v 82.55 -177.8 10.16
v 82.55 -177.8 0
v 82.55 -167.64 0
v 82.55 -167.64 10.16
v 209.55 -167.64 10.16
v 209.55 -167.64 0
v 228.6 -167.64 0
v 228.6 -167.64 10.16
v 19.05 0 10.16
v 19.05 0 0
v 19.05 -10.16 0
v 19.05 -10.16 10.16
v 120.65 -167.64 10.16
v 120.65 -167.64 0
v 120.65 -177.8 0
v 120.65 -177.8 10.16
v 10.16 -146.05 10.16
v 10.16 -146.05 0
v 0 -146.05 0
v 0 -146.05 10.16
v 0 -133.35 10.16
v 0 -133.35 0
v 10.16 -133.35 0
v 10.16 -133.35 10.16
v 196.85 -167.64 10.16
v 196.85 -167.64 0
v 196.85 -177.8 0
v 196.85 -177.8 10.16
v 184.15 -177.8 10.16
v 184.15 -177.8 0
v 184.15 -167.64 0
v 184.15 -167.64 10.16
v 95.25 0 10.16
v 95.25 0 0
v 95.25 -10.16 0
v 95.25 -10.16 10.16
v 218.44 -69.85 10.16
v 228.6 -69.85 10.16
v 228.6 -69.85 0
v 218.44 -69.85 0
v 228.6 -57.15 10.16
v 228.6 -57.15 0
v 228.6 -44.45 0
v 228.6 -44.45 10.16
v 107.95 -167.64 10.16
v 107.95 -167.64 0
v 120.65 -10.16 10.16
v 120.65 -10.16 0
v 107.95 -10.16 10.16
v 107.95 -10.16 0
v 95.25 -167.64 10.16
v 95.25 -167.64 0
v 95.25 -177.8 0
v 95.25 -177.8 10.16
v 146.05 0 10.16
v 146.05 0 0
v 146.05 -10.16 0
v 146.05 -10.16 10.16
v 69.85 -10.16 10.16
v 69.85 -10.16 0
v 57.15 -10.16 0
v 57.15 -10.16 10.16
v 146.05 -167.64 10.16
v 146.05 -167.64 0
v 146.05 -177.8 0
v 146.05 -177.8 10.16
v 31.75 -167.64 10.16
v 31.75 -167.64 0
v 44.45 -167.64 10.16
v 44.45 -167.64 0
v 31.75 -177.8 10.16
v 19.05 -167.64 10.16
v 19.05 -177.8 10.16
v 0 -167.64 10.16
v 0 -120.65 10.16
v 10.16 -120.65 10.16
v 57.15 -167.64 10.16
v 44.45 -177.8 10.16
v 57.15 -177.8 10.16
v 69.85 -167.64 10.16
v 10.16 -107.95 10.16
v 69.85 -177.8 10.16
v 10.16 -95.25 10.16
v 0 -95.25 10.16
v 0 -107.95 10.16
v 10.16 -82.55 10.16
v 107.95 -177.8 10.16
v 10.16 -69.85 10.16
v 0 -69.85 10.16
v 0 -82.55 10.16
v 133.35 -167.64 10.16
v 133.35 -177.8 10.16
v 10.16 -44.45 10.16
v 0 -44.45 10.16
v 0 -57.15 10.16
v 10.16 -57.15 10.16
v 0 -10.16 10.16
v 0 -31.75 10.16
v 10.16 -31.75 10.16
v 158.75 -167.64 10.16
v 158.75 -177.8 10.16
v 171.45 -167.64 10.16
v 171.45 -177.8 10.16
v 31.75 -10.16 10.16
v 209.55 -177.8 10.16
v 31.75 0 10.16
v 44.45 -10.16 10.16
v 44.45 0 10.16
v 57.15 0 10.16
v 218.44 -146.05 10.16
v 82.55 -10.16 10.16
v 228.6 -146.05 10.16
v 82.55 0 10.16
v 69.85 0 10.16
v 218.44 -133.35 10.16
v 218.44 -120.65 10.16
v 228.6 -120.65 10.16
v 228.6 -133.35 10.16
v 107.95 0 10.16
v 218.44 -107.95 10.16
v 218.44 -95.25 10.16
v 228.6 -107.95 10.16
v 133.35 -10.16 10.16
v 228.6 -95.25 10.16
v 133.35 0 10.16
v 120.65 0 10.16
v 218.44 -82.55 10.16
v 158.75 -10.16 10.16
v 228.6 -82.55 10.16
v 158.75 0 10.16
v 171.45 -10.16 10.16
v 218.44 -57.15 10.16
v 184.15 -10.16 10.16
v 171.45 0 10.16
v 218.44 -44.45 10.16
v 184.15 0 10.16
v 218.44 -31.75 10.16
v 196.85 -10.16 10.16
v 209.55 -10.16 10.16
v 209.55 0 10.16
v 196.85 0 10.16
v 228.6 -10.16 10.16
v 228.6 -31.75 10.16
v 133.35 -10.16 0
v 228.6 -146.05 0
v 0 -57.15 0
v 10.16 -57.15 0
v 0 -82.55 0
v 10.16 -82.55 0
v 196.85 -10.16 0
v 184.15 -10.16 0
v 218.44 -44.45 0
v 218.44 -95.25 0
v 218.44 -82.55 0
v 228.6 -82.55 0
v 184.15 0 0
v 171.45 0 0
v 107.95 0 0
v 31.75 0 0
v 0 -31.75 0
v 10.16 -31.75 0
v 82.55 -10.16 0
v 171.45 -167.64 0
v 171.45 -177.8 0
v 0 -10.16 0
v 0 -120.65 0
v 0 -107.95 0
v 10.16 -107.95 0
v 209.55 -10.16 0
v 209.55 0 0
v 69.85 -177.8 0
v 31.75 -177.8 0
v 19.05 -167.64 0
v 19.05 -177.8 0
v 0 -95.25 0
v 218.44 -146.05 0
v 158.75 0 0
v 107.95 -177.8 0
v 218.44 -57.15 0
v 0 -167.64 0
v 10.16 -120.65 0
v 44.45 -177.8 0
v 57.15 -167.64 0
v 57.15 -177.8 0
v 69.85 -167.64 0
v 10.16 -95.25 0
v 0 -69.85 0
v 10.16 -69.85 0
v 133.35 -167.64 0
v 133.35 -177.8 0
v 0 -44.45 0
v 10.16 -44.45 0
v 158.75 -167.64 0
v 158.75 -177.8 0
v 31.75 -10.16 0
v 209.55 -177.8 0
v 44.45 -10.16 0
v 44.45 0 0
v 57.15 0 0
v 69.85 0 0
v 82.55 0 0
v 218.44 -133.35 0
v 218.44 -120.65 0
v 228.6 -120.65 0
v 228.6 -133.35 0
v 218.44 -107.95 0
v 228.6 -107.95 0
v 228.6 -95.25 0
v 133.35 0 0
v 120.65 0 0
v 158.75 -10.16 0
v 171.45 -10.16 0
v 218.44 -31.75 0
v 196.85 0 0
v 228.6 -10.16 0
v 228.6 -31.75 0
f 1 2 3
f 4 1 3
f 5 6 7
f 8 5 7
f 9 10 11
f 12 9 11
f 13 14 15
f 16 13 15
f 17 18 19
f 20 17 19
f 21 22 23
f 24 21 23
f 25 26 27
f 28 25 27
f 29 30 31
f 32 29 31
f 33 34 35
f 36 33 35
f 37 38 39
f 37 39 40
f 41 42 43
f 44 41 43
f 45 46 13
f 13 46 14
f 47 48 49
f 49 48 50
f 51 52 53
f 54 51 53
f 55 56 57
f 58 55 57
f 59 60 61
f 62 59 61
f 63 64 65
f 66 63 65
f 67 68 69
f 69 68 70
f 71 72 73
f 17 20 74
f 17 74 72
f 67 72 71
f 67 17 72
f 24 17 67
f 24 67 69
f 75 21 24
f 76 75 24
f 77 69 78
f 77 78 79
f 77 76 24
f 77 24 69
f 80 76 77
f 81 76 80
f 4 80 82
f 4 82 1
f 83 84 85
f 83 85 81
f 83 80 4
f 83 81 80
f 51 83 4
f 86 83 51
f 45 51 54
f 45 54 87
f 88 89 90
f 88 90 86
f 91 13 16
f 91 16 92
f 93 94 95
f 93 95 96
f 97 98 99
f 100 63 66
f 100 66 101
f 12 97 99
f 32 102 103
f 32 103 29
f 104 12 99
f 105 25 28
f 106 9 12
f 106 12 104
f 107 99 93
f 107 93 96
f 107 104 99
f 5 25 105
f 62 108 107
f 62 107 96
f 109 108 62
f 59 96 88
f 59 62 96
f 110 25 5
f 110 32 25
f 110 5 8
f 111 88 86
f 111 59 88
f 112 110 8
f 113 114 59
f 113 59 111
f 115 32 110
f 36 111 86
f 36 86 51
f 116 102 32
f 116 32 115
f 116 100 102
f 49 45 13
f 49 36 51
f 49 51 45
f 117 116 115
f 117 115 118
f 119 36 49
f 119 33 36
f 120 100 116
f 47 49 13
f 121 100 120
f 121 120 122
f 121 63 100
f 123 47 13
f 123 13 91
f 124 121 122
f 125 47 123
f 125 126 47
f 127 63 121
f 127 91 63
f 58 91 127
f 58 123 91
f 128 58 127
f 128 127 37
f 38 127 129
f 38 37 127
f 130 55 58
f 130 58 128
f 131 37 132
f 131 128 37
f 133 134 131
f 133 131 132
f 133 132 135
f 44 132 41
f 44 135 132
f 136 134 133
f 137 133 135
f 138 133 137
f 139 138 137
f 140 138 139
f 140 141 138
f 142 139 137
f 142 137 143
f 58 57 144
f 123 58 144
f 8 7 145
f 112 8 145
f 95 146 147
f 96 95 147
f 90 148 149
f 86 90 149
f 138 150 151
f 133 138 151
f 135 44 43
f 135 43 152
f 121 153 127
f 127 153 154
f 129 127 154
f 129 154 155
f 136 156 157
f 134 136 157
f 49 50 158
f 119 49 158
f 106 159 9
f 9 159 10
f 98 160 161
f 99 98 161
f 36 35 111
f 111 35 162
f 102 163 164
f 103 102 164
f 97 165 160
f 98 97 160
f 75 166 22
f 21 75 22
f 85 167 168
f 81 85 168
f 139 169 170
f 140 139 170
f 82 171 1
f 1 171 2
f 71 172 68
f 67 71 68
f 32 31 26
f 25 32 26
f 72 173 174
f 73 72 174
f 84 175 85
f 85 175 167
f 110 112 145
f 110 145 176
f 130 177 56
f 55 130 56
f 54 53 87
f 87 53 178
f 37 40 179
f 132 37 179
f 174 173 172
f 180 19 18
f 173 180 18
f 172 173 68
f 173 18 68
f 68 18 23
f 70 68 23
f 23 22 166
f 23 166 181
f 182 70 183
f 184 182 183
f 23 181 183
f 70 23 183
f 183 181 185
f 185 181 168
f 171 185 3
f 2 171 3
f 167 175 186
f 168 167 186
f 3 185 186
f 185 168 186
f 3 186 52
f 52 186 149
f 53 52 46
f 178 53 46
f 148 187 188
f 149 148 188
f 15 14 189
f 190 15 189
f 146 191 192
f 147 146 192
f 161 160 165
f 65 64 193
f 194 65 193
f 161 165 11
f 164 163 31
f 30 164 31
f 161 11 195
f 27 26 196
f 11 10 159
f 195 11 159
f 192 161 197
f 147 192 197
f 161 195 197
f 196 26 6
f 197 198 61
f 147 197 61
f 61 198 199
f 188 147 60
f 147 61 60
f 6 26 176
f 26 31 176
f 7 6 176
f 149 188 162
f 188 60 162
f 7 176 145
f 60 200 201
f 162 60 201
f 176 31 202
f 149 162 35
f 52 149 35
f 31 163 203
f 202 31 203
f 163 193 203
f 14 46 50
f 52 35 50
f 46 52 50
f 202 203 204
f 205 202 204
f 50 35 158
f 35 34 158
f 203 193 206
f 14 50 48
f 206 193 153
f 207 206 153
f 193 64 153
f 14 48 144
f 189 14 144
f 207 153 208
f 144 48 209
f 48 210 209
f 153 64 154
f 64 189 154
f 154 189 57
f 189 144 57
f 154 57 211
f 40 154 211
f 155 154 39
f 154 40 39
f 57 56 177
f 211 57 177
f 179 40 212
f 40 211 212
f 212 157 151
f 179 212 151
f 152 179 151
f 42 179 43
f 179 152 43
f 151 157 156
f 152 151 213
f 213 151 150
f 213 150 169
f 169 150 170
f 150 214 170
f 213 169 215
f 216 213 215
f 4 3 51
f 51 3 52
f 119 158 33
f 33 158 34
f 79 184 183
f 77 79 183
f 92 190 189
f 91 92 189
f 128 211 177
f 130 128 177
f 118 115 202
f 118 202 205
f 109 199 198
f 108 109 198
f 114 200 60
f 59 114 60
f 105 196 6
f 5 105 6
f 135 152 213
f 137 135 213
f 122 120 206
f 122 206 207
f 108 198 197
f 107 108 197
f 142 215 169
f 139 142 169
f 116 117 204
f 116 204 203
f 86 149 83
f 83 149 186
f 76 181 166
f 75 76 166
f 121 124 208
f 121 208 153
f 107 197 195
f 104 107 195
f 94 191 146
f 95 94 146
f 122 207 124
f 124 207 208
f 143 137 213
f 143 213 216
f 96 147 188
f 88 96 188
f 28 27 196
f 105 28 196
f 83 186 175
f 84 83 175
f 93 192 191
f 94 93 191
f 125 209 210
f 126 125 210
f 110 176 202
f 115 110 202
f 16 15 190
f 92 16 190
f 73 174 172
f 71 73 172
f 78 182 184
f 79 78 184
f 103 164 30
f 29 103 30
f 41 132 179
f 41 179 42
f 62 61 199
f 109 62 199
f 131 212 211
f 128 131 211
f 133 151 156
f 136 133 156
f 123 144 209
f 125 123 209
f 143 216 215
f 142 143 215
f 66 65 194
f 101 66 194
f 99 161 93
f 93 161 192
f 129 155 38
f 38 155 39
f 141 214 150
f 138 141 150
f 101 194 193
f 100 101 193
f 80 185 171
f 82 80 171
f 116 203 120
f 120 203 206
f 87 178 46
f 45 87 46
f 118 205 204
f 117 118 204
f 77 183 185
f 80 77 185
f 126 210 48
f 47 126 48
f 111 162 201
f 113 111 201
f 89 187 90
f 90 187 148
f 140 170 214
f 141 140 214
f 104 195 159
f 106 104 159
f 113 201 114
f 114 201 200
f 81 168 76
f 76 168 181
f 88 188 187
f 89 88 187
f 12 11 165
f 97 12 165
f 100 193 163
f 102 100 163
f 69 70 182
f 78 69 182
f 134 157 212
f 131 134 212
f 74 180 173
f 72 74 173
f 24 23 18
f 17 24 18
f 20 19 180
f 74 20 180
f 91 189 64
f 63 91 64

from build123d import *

# Parameters (mm, degrees)
F1_DEPTH = 10.16


with BuildPart() as f1:
    # F0 (on Top) → F1 (new body)
    with BuildSketch(Plane.XY):
        Polygon((31.75, 0), (19.05, 0), (19.05, -10.16), (0, -10.16), (0, -31.75), (10.16, -31.75), (10.16, -44.45), (0, -44.45), (0, -57.15), (10.16, -57.15), (10.16, -69.85), (0, -69.85), (0, -82.55), (10.16, -82.55), (10.16, -95.25), (0, -95.25), (0, -107.95), (10.16, -107.95), (10.16, -120.65), (0, -120.65), (0, -133.35), (10.16, -133.35), (10.16, -146.05), (0, -146.05), (0, -167.64), (19.05, -167.64), (19.05, -177.8), (31.75, -177.8), (31.75, -167.64), (44.45, -167.64), (44.45, -177.8), (57.15, -177.8), (57.15, -167.64), (69.85, -167.64), (69.85, -177.8), (82.55, -177.8), (82.55, -167.64), (95.25, -167.64), (95.25, -177.8), (107.95, -177.8), (107.95, -167.64), (120.65, -167.64), (120.65, -177.8), (133.35, -177.8), (133.35, -167.64), (146.05, -167.64), (146.05, -177.8), (158.75, -177.8), (158.75, -167.64), (171.45, -167.64), (171.45, -177.8), (184.15, -177.8), (184.15, -167.64), (196.85, -167.64), (196.85, -177.8), (209.55, -177.8), (209.55, -167.64), (228.6, -167.64), (228.6, -146.05), (218.44, -146.05), (218.44, -133.35), (228.6, -133.35), (228.6, -120.65), (218.44, -120.65), (218.44, -107.95), (228.6, -107.95), (228.6, -95.25), (218.44, -95.25), (218.44, -82.55), (228.6, -82.55), (228.6, -69.85), (218.44, -69.85), (218.44, -57.15), (228.6, -57.15), (228.6, -44.45), (218.44, -44.45), (218.44, -31.75), (228.6, -31.75), (228.6, -10.16), (209.55, -10.16), (209.55, 0), (196.85, 0), (196.85, -10.16), (184.15, -10.16), (184.15, 0), (171.45, 0), (171.45, -10.16), (158.75, -10.16), (158.75, 0), (146.05, 0), (146.05, -10.16), (133.35, -10.16), (133.35, 0), (120.65, 0), (120.65, -10.16), (107.95, -10.16), (107.95, 0), (95.25, 0), (95.25, -10.16), (82.55, -10.16), (82.55, 0), (69.85, 0), (69.85, -10.16), (57.15, -10.16), (57.15, 0), (44.45, 0), (44.45, -10.16), (31.75, -10.16), align=None)
    extrude(amount=F1_DEPTH)


solid = f1.part
